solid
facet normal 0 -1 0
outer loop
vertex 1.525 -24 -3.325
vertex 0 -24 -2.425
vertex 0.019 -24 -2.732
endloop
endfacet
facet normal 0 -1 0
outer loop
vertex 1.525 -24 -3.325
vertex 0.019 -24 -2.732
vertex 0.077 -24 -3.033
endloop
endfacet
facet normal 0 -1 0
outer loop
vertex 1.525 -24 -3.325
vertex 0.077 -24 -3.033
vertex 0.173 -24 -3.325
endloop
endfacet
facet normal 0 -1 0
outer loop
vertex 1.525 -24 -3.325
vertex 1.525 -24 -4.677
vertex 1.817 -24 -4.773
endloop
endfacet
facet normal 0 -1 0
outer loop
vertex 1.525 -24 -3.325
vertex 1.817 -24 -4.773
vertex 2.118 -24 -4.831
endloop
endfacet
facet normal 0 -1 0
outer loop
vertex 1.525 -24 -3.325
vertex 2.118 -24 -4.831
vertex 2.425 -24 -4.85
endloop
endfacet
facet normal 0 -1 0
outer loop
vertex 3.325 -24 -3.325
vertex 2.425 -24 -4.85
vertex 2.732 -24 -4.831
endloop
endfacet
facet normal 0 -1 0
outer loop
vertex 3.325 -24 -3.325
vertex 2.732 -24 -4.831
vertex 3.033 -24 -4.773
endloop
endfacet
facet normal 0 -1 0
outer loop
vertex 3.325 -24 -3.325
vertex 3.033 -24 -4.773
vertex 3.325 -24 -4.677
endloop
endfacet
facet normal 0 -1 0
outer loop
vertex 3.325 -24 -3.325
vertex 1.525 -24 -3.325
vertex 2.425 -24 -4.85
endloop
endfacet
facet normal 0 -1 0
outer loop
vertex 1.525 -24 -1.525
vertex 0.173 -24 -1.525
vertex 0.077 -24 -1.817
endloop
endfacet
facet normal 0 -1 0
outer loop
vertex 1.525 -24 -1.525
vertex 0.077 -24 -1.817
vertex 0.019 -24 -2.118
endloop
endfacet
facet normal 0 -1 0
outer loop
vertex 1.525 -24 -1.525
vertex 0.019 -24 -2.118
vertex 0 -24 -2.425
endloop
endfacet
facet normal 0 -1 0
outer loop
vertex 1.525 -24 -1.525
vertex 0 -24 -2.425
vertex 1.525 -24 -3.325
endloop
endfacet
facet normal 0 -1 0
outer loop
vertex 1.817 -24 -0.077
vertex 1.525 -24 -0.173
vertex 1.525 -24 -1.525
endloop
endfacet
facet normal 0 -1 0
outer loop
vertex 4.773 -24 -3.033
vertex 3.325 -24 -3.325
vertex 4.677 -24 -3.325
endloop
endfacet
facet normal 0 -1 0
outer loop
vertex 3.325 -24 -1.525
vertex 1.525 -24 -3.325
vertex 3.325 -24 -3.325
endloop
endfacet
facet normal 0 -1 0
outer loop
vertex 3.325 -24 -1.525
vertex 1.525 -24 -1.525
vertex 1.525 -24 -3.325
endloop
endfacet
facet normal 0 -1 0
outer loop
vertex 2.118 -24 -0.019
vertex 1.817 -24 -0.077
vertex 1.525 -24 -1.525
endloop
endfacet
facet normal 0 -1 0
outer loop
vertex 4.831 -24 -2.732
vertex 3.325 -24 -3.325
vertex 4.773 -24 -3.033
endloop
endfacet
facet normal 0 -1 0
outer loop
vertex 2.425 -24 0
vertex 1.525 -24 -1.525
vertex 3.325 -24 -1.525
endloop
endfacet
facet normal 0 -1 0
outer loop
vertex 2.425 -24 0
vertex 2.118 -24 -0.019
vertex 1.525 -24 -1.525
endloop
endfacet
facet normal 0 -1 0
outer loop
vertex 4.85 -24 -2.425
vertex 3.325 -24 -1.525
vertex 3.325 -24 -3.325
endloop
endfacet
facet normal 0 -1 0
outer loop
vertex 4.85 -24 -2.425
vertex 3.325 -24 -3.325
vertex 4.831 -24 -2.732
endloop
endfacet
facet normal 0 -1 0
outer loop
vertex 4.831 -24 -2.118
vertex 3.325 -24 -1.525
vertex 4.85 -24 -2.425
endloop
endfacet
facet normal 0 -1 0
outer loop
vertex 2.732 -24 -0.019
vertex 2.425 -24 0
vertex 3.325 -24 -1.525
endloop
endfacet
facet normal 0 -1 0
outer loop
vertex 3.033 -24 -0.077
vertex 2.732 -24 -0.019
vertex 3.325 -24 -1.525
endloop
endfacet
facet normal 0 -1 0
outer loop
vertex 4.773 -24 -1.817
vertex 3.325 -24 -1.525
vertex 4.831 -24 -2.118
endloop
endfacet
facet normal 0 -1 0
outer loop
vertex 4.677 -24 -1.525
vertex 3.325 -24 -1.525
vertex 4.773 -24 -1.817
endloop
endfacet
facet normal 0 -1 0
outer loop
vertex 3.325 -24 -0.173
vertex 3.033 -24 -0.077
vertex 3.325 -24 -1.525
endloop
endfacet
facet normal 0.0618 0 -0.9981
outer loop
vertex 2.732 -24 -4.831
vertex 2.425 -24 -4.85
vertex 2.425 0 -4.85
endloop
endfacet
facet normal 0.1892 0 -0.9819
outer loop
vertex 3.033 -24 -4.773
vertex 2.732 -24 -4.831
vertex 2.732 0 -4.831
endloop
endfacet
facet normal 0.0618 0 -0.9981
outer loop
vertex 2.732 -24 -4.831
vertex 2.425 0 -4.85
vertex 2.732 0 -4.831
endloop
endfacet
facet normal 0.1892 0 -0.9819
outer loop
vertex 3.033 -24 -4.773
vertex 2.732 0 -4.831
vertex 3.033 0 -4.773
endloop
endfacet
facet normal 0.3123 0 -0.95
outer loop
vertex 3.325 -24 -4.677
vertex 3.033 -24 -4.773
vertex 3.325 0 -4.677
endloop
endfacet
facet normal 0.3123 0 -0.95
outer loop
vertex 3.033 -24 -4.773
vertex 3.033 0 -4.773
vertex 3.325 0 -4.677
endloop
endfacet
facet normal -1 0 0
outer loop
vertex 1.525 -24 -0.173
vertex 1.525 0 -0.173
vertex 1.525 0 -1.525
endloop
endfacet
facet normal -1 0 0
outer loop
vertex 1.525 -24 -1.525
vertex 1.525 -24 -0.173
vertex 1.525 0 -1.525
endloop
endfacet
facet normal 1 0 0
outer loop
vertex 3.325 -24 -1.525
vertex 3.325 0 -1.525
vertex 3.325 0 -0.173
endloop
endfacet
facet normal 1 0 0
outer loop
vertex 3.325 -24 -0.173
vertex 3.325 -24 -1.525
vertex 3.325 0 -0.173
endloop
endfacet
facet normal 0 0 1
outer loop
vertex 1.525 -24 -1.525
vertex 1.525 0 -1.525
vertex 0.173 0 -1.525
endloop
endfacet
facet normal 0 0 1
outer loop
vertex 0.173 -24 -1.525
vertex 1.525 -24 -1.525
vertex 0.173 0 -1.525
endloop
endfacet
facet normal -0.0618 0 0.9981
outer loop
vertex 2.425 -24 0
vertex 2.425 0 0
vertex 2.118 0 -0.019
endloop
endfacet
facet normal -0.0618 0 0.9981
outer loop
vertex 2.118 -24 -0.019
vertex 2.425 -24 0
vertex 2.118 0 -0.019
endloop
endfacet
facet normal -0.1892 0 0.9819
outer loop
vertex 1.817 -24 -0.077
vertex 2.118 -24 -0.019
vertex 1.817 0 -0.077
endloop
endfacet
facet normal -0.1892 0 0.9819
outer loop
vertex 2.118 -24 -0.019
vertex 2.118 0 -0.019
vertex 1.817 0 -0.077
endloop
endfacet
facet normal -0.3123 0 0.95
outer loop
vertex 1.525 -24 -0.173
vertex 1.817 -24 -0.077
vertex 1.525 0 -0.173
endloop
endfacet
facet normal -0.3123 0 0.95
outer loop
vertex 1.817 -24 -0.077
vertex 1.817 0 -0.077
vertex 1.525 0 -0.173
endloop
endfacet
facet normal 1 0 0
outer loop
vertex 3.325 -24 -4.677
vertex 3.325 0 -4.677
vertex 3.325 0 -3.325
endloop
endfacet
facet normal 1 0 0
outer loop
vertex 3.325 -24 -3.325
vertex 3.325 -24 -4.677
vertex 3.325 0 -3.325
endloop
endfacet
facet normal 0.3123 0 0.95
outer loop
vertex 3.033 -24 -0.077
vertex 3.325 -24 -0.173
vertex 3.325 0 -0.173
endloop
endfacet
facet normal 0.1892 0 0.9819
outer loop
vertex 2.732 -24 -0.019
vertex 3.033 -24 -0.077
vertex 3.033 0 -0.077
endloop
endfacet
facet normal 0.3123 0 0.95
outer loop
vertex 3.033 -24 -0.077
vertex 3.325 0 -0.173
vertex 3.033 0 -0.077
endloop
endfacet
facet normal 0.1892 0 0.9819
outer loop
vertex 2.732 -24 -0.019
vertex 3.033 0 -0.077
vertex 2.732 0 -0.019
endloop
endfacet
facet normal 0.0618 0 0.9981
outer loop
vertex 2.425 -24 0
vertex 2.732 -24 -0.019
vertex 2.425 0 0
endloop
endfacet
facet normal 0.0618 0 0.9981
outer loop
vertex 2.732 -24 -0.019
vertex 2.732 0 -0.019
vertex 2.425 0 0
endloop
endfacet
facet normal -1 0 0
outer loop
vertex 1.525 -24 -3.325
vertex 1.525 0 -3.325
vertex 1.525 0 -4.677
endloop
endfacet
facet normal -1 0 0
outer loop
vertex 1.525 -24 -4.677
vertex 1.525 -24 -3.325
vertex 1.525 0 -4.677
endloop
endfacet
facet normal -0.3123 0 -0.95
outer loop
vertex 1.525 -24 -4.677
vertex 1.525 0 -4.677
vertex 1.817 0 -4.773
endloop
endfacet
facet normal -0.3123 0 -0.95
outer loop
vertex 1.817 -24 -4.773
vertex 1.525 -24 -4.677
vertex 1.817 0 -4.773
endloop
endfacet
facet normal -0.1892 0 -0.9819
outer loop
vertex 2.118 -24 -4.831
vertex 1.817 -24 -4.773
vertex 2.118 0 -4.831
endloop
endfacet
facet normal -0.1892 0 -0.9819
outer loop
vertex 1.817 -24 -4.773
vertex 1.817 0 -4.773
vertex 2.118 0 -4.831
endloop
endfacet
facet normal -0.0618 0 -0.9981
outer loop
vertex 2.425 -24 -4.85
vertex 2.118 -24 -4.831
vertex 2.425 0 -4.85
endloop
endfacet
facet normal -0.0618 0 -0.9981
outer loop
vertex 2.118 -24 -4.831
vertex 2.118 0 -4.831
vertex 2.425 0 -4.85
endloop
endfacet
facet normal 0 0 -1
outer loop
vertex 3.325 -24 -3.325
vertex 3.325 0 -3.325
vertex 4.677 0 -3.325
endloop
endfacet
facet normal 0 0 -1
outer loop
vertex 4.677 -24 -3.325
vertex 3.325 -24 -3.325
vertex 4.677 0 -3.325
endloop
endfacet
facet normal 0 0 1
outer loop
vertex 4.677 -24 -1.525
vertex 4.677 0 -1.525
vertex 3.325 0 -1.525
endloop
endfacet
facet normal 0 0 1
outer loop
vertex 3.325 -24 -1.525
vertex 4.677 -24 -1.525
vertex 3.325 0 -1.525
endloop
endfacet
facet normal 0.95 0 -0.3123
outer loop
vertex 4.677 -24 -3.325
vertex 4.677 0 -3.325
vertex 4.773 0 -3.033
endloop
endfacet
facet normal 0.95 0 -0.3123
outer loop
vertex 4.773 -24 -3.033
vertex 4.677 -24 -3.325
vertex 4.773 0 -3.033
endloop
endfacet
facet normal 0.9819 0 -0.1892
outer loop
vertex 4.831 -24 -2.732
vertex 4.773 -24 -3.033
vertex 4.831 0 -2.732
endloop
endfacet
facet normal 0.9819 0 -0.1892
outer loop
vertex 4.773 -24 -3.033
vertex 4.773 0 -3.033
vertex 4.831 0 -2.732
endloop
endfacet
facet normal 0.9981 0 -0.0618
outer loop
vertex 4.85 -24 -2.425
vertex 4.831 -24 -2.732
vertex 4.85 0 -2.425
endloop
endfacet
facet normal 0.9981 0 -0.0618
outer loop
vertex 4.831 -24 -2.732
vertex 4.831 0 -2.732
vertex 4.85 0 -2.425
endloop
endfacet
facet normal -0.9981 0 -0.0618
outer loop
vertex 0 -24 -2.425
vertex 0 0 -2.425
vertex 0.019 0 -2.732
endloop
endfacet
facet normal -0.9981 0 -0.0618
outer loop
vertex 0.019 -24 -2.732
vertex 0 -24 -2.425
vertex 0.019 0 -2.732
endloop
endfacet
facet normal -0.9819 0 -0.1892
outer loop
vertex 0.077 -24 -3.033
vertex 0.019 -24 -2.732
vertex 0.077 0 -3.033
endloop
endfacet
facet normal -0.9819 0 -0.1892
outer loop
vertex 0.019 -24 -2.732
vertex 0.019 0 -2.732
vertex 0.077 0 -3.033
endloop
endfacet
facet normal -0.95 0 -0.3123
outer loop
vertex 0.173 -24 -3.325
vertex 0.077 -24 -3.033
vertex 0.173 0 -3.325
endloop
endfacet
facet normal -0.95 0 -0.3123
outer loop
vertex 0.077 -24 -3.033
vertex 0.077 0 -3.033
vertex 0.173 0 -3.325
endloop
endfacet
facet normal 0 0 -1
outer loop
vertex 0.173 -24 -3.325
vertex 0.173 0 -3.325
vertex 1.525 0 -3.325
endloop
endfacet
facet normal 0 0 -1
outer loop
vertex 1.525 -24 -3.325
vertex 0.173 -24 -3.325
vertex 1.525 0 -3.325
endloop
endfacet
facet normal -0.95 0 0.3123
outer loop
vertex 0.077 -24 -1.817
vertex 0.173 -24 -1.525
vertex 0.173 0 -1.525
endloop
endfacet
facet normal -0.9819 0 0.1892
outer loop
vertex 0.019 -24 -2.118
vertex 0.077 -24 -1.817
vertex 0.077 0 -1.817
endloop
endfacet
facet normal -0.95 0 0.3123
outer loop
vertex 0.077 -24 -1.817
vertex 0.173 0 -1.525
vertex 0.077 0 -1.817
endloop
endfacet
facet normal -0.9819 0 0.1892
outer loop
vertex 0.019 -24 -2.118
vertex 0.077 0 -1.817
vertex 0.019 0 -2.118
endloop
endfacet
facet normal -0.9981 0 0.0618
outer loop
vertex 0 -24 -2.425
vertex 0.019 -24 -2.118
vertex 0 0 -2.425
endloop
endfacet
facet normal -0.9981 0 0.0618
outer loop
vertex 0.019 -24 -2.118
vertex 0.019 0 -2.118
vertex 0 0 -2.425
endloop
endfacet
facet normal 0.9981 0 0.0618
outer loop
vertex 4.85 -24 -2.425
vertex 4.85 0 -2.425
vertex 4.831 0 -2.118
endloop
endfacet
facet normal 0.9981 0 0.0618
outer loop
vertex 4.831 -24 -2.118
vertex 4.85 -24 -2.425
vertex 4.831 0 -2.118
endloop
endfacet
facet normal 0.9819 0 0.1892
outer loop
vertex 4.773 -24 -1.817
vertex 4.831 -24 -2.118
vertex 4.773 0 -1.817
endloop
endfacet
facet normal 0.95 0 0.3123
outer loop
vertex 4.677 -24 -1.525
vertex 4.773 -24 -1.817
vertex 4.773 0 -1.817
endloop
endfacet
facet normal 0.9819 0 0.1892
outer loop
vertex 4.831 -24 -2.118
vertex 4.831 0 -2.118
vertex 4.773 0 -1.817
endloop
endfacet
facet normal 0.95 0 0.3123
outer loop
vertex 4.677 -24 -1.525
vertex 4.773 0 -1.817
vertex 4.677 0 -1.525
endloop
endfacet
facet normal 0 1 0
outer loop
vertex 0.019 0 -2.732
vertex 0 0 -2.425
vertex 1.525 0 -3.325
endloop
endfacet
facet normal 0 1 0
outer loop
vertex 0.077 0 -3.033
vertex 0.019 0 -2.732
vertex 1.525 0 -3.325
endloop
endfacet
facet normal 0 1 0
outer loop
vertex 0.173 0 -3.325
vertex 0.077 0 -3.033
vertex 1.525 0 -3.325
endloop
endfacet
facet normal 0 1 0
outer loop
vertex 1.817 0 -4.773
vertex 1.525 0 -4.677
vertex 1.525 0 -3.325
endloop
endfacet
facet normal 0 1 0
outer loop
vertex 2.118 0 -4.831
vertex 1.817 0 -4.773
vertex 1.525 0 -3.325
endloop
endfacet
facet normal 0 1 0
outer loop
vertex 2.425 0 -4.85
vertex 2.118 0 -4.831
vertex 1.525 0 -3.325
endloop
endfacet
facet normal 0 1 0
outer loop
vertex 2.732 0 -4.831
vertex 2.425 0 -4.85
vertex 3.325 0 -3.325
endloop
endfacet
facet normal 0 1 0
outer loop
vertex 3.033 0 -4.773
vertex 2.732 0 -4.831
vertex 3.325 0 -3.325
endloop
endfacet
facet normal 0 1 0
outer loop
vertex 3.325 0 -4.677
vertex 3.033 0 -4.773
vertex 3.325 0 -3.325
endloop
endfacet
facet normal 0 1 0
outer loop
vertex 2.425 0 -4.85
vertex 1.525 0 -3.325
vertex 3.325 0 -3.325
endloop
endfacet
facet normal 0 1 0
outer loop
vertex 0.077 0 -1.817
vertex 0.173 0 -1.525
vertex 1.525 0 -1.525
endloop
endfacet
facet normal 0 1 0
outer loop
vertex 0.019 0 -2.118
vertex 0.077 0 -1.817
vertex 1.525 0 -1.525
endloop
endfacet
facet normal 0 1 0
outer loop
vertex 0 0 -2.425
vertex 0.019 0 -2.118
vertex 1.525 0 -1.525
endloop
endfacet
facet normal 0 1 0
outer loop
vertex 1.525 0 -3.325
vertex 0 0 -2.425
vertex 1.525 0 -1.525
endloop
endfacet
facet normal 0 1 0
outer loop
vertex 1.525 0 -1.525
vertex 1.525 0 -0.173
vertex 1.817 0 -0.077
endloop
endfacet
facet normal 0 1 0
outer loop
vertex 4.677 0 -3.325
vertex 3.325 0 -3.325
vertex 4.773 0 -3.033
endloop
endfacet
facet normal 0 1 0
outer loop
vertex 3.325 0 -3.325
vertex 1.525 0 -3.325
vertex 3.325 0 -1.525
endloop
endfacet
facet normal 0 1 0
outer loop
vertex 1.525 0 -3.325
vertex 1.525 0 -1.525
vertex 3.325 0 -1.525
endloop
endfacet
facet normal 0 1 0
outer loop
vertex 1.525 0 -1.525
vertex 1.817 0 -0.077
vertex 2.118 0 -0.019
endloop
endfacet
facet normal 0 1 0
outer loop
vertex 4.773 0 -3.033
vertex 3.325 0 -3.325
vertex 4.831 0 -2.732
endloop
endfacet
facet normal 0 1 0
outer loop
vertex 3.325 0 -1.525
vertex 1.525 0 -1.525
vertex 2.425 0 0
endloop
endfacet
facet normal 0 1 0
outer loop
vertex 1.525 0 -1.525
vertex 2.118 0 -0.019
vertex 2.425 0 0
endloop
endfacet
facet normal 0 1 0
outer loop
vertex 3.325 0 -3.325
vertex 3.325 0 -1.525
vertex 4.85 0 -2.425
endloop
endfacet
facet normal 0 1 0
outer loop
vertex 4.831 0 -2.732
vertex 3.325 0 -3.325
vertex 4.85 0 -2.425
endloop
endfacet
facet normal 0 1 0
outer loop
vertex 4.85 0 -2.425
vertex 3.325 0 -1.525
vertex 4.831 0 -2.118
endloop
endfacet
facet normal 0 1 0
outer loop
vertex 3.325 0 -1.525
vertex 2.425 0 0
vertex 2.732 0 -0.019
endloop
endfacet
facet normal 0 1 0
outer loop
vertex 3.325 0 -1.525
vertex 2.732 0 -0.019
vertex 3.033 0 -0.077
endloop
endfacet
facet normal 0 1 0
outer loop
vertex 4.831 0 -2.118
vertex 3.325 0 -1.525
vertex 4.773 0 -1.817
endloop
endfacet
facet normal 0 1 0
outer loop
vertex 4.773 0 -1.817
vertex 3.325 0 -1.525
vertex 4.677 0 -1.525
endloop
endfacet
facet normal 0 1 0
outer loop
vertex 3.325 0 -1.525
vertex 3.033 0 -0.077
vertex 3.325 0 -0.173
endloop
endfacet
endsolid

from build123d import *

# Parameters (mm, degrees)
F1_DEPTH = 24


with BuildPart() as f1:
    # F0 (on Front) → F1 (new body)
    with BuildSketch(Plane.XZ):
        with BuildLine():
            ThreePointArc((3.325, -0.173195), (2.883257, -0.043692), (2.425, 0))
            ThreePointArc((2.425, 0), (1.966743, -0.043692), (1.525, -0.173195))
            Line((1.525, -0.173195), (1.525, -1.525))
            Line((1.525, -1.525), (0.173195, -1.525))
            ThreePointArc((0.173195, -1.525), (0.043692, -1.966743), (0, -2.425))
            ThreePointArc((0, -2.425), (0.043692, -2.883257), (0.173195, -3.325))
            Line((0.173195, -3.325), (1.525, -3.325))
            Line((1.525, -3.325), (1.525, -4.676805))
            ThreePointArc((1.525, -4.676805), (1.966743, -4.806308), (2.425, -4.85))
            ThreePointArc((2.425, -4.85), (2.883257, -4.806308), (3.325, -4.676805))
            Line((3.325, -4.676805), (3.325, -3.325))
            Line((3.325, -3.325), (4.676805, -3.325))
            ThreePointArc((4.676805, -3.325), (4.806308, -2.883257), (4.85, -2.425))
            ThreePointArc((4.85, -2.425), (4.806308, -1.966743), (4.676805, -1.525))
            Line((4.676805, -1.525), (3.325, -1.525))
            Line((3.325, -1.525), (3.325, -0.173195))
        make_face()
    extrude(amount=F1_DEPTH)


solid = f1.part
